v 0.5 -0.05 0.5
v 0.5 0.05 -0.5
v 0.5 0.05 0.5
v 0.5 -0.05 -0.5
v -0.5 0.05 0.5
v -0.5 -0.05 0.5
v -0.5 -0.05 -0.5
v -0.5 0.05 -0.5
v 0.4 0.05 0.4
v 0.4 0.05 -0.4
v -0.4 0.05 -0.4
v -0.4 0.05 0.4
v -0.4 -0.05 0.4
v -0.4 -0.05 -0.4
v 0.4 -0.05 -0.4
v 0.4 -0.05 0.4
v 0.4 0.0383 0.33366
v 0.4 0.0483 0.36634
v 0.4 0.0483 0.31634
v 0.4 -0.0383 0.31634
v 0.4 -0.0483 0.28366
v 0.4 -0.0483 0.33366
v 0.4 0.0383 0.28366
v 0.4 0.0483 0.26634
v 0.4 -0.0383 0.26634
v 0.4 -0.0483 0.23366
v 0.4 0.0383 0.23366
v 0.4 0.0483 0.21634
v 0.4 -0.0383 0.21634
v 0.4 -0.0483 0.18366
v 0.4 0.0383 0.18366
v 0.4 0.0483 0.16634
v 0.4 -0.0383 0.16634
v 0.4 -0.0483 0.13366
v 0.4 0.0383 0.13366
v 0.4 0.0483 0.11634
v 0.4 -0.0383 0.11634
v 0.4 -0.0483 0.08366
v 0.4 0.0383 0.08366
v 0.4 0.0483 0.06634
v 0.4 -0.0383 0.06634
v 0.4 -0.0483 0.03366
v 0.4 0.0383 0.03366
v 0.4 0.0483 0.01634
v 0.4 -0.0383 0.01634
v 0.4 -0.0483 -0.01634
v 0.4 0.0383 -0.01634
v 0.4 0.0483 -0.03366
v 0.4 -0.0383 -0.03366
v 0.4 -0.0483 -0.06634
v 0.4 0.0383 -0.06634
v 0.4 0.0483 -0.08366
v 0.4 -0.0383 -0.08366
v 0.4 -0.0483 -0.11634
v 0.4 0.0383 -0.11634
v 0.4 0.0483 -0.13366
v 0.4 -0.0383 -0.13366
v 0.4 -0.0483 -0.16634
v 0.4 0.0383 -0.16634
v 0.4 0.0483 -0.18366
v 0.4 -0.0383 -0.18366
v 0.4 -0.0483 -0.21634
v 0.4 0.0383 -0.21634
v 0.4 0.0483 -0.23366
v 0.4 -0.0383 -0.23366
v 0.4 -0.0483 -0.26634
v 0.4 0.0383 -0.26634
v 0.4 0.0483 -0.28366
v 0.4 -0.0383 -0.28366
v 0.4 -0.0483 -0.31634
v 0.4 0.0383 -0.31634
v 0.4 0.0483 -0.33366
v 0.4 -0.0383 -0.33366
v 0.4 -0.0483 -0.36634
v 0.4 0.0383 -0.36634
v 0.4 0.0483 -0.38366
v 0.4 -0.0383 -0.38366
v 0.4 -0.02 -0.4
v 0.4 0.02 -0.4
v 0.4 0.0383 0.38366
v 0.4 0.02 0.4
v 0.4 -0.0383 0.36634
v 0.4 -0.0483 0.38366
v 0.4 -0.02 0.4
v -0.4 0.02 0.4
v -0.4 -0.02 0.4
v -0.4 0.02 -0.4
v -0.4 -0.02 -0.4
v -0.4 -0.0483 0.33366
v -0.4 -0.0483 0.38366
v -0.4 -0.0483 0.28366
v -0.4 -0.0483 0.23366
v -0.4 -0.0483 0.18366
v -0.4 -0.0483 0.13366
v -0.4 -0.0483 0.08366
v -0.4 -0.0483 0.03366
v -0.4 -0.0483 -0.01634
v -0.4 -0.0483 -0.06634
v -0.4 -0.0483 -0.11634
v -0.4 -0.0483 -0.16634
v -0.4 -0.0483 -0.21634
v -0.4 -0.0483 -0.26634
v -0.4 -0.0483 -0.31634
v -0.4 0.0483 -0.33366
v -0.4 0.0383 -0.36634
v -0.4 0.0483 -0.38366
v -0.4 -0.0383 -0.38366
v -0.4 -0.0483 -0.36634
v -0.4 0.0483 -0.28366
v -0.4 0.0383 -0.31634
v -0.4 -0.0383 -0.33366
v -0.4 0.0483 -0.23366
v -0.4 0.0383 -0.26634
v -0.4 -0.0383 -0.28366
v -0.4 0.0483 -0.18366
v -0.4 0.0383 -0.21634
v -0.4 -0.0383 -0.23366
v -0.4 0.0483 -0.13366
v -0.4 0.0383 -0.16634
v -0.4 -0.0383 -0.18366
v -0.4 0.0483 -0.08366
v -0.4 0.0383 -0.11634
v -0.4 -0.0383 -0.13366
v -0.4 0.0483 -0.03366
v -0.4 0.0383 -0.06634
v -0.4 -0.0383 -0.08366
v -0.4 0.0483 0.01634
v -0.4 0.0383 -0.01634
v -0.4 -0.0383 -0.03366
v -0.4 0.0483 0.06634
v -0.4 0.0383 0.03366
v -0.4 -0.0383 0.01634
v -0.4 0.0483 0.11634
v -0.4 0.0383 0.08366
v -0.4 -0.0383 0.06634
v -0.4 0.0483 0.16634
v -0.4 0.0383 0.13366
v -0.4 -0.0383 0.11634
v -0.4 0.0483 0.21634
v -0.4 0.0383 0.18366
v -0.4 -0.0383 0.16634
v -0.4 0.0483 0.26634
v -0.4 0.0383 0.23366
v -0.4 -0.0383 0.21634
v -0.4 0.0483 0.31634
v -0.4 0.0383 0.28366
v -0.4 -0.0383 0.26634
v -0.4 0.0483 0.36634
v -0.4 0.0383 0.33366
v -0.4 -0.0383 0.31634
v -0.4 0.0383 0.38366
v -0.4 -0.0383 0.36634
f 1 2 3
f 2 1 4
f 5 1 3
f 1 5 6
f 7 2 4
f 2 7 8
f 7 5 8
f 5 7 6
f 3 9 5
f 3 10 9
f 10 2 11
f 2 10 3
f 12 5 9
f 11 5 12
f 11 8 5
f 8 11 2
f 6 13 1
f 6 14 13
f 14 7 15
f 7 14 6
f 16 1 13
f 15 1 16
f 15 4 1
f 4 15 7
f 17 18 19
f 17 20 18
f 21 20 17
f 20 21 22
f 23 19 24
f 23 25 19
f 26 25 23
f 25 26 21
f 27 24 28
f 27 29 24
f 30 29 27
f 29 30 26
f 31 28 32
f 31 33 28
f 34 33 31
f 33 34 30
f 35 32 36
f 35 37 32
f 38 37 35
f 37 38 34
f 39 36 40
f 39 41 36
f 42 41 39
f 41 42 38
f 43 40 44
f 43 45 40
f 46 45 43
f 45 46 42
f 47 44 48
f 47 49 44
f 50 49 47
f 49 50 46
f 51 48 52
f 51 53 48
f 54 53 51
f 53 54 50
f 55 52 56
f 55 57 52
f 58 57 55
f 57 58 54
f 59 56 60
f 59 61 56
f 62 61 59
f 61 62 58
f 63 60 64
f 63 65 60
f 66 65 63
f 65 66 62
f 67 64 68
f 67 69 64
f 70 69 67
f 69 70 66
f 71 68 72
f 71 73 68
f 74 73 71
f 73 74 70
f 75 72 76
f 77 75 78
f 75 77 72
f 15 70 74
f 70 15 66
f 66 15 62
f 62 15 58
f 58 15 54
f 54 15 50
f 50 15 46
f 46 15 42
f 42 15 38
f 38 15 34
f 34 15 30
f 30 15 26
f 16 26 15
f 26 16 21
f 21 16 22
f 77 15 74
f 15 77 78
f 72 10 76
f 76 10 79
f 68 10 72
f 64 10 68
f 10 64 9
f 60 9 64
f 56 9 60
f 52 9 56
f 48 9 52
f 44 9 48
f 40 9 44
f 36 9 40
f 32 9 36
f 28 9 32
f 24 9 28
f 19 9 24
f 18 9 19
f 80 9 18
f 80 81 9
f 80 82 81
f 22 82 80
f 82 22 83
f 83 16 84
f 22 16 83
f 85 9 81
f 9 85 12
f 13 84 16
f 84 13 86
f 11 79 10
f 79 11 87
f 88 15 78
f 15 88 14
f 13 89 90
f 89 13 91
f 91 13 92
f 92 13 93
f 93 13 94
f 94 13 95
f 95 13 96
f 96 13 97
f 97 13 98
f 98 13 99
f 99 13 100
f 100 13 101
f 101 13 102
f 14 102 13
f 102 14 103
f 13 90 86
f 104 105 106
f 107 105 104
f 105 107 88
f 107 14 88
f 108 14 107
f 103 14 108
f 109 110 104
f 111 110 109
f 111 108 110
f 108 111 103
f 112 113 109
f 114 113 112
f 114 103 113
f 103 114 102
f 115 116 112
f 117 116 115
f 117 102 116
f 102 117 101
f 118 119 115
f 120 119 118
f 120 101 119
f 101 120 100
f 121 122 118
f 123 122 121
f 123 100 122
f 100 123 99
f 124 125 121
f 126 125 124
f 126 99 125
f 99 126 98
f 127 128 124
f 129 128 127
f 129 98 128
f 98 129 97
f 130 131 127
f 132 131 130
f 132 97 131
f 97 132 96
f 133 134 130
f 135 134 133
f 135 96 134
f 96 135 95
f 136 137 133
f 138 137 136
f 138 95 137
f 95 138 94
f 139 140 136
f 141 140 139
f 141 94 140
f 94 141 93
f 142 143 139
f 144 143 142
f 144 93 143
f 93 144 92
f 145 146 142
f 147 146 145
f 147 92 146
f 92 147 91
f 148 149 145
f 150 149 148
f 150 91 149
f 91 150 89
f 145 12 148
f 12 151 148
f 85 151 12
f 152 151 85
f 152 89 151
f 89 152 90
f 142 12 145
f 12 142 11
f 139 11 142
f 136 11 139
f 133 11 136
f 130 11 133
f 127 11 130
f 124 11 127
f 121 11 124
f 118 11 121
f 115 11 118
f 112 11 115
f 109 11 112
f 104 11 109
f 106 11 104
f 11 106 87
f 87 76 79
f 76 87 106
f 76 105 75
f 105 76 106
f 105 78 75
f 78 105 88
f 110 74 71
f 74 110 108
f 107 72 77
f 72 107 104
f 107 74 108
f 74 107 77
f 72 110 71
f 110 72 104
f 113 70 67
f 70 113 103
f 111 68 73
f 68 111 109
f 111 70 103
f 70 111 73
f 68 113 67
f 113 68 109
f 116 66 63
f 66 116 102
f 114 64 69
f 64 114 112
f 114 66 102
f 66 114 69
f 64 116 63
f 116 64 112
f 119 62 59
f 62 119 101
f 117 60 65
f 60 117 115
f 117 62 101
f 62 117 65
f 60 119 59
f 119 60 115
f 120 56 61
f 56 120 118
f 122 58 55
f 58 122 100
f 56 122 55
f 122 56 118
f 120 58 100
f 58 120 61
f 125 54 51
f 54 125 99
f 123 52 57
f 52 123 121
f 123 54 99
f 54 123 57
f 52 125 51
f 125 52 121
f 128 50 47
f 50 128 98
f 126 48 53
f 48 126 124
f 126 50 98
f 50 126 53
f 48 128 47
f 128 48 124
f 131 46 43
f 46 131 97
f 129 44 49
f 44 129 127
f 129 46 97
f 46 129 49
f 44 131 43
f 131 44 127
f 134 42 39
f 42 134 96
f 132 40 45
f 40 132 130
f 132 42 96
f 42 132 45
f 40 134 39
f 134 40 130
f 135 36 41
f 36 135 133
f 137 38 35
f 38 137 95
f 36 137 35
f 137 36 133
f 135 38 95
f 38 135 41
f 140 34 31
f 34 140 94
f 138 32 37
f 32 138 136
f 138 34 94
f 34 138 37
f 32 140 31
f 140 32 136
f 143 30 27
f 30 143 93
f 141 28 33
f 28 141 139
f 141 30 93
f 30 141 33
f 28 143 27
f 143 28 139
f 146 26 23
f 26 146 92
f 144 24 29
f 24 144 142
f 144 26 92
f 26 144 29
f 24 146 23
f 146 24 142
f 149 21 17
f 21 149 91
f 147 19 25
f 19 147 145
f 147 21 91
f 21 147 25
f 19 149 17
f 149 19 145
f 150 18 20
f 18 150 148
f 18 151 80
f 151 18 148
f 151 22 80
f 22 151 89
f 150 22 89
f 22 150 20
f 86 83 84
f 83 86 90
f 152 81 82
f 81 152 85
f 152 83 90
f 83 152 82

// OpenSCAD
module Vent_Grid(){

    difference(){
    color("GRAY")
    cube([1,0.1,1], center = true);

    color("GRAY")
    cube([0.8,0.2,0.8], center = true);

    }


    for (i = [-0.4:0.05:0.4] ){

    color("DARKGRAY")
    translate([0,0,i])
    rotate([30,0,0])

    cube([0.9,0.1,0.02], center = true);

    }

}

Vent_Grid();
